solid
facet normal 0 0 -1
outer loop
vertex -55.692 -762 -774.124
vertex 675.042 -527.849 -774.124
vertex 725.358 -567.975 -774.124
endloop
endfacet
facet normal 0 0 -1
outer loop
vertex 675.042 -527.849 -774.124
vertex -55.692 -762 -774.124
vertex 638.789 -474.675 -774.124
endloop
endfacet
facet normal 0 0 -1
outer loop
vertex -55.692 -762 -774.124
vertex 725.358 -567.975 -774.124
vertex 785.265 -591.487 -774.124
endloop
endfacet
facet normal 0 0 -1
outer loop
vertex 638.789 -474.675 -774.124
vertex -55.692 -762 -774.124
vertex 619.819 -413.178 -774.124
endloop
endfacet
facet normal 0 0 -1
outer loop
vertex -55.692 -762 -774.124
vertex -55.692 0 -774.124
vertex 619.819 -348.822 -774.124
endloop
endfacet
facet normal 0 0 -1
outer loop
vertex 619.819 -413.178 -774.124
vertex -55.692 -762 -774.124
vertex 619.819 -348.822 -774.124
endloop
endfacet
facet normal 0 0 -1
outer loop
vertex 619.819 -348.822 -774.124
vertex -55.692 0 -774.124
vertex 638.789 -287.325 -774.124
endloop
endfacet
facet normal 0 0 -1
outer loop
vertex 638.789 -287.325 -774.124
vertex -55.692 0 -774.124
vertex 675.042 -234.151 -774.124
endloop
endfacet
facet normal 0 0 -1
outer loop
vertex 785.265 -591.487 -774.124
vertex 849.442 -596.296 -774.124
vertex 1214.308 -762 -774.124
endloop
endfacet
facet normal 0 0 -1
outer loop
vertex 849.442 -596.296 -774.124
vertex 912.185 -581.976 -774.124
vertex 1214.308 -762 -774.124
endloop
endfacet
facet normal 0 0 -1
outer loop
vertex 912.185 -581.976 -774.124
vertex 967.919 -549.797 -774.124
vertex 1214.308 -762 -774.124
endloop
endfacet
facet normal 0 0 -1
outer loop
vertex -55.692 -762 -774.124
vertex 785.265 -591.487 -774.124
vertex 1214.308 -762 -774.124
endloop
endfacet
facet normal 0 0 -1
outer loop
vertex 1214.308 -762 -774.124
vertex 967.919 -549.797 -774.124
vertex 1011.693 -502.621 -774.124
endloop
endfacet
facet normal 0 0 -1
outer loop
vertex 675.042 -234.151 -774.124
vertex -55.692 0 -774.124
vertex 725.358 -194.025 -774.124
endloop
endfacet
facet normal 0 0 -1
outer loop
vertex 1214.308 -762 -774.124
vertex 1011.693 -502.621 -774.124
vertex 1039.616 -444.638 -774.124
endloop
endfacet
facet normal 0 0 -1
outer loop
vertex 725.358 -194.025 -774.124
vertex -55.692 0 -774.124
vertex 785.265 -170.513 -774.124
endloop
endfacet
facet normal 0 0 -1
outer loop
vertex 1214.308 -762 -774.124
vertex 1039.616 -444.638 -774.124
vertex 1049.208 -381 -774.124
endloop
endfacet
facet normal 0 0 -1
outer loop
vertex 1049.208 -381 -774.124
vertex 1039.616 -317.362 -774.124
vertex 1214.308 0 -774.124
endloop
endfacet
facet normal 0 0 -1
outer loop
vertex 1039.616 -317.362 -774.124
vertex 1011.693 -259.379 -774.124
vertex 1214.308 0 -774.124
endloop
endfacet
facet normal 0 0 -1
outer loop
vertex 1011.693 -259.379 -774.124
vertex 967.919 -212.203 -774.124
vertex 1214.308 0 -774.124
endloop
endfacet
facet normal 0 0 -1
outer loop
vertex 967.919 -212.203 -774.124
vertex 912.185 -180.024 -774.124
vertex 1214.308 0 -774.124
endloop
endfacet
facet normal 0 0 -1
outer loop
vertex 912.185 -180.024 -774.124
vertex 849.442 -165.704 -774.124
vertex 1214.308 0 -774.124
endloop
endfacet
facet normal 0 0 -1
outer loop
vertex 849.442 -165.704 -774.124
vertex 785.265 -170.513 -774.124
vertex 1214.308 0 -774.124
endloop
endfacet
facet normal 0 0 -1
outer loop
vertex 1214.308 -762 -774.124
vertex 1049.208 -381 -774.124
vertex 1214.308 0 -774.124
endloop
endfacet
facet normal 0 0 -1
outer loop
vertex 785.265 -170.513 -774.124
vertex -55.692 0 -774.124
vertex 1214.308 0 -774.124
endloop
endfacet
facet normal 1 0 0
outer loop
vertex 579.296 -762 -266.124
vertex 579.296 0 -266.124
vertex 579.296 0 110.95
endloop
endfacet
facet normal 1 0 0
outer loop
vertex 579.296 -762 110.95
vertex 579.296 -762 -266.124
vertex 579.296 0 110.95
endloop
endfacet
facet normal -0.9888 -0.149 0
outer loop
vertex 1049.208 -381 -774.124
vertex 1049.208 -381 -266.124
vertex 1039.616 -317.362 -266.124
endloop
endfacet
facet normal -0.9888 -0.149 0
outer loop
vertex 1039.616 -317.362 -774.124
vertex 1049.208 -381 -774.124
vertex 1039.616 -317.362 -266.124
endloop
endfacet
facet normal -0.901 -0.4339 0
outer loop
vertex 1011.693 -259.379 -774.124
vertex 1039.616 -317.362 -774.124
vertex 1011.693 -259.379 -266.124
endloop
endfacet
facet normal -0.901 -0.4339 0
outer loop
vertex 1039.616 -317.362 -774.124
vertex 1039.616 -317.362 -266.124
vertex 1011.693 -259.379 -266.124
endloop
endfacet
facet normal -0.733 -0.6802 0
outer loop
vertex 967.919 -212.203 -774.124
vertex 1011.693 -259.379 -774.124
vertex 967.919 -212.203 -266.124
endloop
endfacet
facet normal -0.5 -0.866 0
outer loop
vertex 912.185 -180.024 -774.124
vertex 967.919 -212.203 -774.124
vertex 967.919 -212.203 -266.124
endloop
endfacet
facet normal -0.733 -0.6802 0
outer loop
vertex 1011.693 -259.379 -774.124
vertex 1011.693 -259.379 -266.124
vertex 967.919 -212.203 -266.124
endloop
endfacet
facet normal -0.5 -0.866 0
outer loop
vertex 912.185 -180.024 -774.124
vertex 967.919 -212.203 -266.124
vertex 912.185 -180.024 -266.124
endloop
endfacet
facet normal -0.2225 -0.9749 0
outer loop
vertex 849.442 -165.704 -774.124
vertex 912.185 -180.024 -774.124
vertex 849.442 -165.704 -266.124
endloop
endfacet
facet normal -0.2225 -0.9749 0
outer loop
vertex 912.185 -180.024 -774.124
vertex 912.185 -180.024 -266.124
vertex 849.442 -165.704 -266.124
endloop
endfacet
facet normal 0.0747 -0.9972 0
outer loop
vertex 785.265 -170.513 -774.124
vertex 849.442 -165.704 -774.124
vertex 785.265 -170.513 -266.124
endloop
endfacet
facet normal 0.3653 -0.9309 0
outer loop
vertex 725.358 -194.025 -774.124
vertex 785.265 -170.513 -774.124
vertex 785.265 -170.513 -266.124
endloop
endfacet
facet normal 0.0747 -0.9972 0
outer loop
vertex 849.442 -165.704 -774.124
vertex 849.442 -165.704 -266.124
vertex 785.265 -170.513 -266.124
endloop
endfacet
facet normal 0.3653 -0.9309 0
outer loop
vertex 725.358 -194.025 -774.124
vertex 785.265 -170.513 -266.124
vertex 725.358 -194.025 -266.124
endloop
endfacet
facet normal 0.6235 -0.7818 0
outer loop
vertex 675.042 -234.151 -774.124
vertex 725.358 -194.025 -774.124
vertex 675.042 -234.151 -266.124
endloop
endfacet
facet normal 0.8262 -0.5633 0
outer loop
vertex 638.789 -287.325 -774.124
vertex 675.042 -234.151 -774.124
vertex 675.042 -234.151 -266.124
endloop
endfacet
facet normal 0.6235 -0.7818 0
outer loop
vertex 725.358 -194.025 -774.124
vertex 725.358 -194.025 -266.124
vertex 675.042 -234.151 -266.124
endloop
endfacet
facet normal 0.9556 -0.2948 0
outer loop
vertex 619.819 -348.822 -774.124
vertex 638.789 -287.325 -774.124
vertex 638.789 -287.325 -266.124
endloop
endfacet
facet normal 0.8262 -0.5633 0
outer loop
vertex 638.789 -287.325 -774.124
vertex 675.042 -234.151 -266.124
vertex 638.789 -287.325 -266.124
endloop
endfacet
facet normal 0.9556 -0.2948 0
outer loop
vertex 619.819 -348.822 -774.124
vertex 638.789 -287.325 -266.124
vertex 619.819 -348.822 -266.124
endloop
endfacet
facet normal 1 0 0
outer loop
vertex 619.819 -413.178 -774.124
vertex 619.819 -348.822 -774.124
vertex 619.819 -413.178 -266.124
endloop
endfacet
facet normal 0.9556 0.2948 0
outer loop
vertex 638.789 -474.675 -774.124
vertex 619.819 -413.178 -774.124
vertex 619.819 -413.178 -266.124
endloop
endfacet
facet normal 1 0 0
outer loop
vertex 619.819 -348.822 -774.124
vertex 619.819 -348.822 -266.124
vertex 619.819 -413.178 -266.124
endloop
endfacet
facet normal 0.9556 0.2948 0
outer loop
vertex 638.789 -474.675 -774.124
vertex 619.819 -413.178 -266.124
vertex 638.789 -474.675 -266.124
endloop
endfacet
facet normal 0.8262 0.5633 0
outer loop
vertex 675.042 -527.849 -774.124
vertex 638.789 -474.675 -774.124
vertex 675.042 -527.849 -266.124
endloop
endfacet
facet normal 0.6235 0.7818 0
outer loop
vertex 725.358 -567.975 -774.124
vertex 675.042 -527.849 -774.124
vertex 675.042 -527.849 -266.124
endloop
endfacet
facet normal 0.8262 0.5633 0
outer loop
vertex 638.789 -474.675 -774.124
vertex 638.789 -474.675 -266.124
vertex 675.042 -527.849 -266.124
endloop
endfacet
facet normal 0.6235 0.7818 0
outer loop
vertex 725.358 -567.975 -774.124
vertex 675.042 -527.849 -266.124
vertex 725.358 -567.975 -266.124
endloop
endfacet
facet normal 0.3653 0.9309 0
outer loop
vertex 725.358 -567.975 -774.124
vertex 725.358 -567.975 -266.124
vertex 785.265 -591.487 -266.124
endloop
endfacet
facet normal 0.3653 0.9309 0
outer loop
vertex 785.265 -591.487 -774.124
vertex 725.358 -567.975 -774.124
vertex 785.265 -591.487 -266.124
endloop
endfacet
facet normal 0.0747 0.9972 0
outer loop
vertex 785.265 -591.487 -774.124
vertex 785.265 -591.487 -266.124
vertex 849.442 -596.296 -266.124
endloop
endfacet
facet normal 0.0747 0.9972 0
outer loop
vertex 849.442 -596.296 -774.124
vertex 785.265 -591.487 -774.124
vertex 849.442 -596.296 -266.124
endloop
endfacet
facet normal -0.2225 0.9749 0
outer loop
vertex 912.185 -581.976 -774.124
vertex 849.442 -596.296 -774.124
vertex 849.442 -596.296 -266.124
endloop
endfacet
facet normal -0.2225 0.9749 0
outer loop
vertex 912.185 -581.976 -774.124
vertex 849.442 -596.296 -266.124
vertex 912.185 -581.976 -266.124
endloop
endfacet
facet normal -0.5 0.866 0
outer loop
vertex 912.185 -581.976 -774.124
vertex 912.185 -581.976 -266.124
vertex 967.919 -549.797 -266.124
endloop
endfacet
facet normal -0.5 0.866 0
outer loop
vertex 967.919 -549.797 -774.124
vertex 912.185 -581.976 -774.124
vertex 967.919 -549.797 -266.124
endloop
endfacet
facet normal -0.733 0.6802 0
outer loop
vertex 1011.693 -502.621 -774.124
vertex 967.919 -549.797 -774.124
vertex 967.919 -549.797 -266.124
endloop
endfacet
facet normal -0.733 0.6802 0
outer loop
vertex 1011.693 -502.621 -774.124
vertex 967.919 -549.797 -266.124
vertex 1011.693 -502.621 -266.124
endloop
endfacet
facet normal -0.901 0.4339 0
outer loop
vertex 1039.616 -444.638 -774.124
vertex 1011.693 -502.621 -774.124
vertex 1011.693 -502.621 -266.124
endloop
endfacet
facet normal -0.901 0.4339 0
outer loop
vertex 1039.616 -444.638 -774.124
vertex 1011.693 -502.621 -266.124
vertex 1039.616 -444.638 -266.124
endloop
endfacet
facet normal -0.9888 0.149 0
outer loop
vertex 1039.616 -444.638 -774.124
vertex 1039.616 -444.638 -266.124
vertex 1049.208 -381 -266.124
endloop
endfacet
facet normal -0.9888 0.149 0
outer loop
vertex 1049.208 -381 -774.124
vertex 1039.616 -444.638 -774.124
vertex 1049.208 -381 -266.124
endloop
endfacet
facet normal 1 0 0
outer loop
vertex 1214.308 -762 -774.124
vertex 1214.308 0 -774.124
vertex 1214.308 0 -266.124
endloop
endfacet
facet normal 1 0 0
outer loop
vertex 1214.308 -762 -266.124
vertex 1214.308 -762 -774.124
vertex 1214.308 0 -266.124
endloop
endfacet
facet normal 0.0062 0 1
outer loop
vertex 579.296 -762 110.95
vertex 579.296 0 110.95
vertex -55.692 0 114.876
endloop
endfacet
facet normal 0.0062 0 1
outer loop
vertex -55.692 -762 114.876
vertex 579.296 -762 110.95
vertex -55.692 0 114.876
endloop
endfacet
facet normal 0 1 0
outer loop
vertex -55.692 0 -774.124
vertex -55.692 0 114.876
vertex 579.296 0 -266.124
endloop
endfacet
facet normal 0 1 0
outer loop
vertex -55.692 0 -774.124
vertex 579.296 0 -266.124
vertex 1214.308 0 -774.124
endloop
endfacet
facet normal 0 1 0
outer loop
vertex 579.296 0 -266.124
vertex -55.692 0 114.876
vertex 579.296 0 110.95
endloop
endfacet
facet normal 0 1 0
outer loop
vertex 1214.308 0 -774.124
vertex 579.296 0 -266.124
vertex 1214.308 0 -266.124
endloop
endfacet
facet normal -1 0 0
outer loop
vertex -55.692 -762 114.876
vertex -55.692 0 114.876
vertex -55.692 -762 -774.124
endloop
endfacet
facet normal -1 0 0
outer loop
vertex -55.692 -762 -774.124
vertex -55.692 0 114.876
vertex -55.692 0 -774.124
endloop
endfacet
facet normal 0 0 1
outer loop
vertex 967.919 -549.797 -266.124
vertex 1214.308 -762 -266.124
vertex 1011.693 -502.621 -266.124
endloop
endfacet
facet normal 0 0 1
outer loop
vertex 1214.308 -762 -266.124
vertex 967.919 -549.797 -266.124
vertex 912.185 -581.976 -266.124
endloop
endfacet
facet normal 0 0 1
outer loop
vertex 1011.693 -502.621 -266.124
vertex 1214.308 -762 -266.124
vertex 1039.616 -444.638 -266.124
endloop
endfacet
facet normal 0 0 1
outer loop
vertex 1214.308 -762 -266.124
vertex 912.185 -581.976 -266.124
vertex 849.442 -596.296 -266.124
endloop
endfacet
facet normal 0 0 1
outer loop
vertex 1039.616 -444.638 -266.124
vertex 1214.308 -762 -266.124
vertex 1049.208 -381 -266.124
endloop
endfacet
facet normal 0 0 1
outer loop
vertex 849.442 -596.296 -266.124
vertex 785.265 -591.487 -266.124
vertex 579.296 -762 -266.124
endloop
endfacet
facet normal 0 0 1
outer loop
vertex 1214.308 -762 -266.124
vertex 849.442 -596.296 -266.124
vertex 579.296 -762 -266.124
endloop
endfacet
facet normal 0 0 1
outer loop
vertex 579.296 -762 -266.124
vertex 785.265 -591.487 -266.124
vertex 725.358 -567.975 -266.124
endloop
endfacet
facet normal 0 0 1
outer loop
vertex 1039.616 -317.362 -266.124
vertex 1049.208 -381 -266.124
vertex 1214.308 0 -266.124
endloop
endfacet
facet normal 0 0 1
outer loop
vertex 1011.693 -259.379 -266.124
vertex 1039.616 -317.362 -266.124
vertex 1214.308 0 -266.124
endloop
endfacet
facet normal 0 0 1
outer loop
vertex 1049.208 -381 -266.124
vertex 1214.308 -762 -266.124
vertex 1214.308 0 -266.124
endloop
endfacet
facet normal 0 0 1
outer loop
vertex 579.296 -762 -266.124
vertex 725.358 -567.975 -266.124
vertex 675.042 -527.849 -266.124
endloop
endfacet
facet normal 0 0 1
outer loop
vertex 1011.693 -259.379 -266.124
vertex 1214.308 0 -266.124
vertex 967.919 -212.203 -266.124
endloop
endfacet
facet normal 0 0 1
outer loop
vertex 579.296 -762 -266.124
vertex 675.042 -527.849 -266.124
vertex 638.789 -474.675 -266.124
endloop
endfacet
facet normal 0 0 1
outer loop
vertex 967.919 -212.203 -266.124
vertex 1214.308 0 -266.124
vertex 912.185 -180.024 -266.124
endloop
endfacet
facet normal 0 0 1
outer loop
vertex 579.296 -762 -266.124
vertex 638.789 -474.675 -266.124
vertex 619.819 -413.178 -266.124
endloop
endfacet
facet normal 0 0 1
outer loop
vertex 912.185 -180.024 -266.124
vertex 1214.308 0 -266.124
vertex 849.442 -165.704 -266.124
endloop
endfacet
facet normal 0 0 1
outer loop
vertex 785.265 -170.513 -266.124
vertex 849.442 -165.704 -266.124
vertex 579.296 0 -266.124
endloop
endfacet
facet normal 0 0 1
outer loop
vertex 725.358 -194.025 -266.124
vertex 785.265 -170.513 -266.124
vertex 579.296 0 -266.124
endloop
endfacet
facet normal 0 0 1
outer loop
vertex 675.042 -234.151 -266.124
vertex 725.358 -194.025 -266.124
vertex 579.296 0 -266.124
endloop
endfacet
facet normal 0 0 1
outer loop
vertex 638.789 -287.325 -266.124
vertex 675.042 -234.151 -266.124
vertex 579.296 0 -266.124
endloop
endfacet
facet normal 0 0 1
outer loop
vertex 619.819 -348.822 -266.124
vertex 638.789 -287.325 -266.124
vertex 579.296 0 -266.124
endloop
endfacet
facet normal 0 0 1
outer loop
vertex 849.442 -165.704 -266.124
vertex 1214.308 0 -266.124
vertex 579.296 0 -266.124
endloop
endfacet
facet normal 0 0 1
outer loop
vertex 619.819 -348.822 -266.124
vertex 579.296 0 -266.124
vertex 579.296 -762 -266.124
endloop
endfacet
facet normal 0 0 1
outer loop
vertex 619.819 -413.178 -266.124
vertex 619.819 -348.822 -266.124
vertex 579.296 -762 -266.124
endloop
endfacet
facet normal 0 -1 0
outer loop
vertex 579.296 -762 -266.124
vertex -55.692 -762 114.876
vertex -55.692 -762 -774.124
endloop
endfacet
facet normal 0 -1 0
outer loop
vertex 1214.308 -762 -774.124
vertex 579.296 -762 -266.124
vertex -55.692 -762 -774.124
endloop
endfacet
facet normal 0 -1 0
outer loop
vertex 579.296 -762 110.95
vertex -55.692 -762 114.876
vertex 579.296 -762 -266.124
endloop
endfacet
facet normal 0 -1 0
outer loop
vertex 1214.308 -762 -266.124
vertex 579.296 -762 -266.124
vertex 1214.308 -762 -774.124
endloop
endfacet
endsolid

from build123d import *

# Parameters (mm, degrees)
F1_DEPTH = 762
F2_R     = 215.9
F3_DEPTH = 508.001


with BuildPart() as f1:
    # F0 (on Front) → F1 (new body)
    with BuildSketch(Plane.XZ):
        Polygon((579.295597, 110.950105), (-55.692269, 114.875649), (-55.692269, -774.124351), (1214.307731, -774.124351), (1214.307731, -266.124351), (579.295597, -266.124351), align=None)
    extrude(amount=F1_DEPTH)

    # F2 (on face) → F3 (cut, through all)
    with BuildSketch(Plane.XY.offset(-266.124351)):
        with Locations((833.307731, -381)):
            Circle(F2_R)
    extrude(amount=-F3_DEPTH, mode=Mode.SUBTRACT)


solid = f1.part
